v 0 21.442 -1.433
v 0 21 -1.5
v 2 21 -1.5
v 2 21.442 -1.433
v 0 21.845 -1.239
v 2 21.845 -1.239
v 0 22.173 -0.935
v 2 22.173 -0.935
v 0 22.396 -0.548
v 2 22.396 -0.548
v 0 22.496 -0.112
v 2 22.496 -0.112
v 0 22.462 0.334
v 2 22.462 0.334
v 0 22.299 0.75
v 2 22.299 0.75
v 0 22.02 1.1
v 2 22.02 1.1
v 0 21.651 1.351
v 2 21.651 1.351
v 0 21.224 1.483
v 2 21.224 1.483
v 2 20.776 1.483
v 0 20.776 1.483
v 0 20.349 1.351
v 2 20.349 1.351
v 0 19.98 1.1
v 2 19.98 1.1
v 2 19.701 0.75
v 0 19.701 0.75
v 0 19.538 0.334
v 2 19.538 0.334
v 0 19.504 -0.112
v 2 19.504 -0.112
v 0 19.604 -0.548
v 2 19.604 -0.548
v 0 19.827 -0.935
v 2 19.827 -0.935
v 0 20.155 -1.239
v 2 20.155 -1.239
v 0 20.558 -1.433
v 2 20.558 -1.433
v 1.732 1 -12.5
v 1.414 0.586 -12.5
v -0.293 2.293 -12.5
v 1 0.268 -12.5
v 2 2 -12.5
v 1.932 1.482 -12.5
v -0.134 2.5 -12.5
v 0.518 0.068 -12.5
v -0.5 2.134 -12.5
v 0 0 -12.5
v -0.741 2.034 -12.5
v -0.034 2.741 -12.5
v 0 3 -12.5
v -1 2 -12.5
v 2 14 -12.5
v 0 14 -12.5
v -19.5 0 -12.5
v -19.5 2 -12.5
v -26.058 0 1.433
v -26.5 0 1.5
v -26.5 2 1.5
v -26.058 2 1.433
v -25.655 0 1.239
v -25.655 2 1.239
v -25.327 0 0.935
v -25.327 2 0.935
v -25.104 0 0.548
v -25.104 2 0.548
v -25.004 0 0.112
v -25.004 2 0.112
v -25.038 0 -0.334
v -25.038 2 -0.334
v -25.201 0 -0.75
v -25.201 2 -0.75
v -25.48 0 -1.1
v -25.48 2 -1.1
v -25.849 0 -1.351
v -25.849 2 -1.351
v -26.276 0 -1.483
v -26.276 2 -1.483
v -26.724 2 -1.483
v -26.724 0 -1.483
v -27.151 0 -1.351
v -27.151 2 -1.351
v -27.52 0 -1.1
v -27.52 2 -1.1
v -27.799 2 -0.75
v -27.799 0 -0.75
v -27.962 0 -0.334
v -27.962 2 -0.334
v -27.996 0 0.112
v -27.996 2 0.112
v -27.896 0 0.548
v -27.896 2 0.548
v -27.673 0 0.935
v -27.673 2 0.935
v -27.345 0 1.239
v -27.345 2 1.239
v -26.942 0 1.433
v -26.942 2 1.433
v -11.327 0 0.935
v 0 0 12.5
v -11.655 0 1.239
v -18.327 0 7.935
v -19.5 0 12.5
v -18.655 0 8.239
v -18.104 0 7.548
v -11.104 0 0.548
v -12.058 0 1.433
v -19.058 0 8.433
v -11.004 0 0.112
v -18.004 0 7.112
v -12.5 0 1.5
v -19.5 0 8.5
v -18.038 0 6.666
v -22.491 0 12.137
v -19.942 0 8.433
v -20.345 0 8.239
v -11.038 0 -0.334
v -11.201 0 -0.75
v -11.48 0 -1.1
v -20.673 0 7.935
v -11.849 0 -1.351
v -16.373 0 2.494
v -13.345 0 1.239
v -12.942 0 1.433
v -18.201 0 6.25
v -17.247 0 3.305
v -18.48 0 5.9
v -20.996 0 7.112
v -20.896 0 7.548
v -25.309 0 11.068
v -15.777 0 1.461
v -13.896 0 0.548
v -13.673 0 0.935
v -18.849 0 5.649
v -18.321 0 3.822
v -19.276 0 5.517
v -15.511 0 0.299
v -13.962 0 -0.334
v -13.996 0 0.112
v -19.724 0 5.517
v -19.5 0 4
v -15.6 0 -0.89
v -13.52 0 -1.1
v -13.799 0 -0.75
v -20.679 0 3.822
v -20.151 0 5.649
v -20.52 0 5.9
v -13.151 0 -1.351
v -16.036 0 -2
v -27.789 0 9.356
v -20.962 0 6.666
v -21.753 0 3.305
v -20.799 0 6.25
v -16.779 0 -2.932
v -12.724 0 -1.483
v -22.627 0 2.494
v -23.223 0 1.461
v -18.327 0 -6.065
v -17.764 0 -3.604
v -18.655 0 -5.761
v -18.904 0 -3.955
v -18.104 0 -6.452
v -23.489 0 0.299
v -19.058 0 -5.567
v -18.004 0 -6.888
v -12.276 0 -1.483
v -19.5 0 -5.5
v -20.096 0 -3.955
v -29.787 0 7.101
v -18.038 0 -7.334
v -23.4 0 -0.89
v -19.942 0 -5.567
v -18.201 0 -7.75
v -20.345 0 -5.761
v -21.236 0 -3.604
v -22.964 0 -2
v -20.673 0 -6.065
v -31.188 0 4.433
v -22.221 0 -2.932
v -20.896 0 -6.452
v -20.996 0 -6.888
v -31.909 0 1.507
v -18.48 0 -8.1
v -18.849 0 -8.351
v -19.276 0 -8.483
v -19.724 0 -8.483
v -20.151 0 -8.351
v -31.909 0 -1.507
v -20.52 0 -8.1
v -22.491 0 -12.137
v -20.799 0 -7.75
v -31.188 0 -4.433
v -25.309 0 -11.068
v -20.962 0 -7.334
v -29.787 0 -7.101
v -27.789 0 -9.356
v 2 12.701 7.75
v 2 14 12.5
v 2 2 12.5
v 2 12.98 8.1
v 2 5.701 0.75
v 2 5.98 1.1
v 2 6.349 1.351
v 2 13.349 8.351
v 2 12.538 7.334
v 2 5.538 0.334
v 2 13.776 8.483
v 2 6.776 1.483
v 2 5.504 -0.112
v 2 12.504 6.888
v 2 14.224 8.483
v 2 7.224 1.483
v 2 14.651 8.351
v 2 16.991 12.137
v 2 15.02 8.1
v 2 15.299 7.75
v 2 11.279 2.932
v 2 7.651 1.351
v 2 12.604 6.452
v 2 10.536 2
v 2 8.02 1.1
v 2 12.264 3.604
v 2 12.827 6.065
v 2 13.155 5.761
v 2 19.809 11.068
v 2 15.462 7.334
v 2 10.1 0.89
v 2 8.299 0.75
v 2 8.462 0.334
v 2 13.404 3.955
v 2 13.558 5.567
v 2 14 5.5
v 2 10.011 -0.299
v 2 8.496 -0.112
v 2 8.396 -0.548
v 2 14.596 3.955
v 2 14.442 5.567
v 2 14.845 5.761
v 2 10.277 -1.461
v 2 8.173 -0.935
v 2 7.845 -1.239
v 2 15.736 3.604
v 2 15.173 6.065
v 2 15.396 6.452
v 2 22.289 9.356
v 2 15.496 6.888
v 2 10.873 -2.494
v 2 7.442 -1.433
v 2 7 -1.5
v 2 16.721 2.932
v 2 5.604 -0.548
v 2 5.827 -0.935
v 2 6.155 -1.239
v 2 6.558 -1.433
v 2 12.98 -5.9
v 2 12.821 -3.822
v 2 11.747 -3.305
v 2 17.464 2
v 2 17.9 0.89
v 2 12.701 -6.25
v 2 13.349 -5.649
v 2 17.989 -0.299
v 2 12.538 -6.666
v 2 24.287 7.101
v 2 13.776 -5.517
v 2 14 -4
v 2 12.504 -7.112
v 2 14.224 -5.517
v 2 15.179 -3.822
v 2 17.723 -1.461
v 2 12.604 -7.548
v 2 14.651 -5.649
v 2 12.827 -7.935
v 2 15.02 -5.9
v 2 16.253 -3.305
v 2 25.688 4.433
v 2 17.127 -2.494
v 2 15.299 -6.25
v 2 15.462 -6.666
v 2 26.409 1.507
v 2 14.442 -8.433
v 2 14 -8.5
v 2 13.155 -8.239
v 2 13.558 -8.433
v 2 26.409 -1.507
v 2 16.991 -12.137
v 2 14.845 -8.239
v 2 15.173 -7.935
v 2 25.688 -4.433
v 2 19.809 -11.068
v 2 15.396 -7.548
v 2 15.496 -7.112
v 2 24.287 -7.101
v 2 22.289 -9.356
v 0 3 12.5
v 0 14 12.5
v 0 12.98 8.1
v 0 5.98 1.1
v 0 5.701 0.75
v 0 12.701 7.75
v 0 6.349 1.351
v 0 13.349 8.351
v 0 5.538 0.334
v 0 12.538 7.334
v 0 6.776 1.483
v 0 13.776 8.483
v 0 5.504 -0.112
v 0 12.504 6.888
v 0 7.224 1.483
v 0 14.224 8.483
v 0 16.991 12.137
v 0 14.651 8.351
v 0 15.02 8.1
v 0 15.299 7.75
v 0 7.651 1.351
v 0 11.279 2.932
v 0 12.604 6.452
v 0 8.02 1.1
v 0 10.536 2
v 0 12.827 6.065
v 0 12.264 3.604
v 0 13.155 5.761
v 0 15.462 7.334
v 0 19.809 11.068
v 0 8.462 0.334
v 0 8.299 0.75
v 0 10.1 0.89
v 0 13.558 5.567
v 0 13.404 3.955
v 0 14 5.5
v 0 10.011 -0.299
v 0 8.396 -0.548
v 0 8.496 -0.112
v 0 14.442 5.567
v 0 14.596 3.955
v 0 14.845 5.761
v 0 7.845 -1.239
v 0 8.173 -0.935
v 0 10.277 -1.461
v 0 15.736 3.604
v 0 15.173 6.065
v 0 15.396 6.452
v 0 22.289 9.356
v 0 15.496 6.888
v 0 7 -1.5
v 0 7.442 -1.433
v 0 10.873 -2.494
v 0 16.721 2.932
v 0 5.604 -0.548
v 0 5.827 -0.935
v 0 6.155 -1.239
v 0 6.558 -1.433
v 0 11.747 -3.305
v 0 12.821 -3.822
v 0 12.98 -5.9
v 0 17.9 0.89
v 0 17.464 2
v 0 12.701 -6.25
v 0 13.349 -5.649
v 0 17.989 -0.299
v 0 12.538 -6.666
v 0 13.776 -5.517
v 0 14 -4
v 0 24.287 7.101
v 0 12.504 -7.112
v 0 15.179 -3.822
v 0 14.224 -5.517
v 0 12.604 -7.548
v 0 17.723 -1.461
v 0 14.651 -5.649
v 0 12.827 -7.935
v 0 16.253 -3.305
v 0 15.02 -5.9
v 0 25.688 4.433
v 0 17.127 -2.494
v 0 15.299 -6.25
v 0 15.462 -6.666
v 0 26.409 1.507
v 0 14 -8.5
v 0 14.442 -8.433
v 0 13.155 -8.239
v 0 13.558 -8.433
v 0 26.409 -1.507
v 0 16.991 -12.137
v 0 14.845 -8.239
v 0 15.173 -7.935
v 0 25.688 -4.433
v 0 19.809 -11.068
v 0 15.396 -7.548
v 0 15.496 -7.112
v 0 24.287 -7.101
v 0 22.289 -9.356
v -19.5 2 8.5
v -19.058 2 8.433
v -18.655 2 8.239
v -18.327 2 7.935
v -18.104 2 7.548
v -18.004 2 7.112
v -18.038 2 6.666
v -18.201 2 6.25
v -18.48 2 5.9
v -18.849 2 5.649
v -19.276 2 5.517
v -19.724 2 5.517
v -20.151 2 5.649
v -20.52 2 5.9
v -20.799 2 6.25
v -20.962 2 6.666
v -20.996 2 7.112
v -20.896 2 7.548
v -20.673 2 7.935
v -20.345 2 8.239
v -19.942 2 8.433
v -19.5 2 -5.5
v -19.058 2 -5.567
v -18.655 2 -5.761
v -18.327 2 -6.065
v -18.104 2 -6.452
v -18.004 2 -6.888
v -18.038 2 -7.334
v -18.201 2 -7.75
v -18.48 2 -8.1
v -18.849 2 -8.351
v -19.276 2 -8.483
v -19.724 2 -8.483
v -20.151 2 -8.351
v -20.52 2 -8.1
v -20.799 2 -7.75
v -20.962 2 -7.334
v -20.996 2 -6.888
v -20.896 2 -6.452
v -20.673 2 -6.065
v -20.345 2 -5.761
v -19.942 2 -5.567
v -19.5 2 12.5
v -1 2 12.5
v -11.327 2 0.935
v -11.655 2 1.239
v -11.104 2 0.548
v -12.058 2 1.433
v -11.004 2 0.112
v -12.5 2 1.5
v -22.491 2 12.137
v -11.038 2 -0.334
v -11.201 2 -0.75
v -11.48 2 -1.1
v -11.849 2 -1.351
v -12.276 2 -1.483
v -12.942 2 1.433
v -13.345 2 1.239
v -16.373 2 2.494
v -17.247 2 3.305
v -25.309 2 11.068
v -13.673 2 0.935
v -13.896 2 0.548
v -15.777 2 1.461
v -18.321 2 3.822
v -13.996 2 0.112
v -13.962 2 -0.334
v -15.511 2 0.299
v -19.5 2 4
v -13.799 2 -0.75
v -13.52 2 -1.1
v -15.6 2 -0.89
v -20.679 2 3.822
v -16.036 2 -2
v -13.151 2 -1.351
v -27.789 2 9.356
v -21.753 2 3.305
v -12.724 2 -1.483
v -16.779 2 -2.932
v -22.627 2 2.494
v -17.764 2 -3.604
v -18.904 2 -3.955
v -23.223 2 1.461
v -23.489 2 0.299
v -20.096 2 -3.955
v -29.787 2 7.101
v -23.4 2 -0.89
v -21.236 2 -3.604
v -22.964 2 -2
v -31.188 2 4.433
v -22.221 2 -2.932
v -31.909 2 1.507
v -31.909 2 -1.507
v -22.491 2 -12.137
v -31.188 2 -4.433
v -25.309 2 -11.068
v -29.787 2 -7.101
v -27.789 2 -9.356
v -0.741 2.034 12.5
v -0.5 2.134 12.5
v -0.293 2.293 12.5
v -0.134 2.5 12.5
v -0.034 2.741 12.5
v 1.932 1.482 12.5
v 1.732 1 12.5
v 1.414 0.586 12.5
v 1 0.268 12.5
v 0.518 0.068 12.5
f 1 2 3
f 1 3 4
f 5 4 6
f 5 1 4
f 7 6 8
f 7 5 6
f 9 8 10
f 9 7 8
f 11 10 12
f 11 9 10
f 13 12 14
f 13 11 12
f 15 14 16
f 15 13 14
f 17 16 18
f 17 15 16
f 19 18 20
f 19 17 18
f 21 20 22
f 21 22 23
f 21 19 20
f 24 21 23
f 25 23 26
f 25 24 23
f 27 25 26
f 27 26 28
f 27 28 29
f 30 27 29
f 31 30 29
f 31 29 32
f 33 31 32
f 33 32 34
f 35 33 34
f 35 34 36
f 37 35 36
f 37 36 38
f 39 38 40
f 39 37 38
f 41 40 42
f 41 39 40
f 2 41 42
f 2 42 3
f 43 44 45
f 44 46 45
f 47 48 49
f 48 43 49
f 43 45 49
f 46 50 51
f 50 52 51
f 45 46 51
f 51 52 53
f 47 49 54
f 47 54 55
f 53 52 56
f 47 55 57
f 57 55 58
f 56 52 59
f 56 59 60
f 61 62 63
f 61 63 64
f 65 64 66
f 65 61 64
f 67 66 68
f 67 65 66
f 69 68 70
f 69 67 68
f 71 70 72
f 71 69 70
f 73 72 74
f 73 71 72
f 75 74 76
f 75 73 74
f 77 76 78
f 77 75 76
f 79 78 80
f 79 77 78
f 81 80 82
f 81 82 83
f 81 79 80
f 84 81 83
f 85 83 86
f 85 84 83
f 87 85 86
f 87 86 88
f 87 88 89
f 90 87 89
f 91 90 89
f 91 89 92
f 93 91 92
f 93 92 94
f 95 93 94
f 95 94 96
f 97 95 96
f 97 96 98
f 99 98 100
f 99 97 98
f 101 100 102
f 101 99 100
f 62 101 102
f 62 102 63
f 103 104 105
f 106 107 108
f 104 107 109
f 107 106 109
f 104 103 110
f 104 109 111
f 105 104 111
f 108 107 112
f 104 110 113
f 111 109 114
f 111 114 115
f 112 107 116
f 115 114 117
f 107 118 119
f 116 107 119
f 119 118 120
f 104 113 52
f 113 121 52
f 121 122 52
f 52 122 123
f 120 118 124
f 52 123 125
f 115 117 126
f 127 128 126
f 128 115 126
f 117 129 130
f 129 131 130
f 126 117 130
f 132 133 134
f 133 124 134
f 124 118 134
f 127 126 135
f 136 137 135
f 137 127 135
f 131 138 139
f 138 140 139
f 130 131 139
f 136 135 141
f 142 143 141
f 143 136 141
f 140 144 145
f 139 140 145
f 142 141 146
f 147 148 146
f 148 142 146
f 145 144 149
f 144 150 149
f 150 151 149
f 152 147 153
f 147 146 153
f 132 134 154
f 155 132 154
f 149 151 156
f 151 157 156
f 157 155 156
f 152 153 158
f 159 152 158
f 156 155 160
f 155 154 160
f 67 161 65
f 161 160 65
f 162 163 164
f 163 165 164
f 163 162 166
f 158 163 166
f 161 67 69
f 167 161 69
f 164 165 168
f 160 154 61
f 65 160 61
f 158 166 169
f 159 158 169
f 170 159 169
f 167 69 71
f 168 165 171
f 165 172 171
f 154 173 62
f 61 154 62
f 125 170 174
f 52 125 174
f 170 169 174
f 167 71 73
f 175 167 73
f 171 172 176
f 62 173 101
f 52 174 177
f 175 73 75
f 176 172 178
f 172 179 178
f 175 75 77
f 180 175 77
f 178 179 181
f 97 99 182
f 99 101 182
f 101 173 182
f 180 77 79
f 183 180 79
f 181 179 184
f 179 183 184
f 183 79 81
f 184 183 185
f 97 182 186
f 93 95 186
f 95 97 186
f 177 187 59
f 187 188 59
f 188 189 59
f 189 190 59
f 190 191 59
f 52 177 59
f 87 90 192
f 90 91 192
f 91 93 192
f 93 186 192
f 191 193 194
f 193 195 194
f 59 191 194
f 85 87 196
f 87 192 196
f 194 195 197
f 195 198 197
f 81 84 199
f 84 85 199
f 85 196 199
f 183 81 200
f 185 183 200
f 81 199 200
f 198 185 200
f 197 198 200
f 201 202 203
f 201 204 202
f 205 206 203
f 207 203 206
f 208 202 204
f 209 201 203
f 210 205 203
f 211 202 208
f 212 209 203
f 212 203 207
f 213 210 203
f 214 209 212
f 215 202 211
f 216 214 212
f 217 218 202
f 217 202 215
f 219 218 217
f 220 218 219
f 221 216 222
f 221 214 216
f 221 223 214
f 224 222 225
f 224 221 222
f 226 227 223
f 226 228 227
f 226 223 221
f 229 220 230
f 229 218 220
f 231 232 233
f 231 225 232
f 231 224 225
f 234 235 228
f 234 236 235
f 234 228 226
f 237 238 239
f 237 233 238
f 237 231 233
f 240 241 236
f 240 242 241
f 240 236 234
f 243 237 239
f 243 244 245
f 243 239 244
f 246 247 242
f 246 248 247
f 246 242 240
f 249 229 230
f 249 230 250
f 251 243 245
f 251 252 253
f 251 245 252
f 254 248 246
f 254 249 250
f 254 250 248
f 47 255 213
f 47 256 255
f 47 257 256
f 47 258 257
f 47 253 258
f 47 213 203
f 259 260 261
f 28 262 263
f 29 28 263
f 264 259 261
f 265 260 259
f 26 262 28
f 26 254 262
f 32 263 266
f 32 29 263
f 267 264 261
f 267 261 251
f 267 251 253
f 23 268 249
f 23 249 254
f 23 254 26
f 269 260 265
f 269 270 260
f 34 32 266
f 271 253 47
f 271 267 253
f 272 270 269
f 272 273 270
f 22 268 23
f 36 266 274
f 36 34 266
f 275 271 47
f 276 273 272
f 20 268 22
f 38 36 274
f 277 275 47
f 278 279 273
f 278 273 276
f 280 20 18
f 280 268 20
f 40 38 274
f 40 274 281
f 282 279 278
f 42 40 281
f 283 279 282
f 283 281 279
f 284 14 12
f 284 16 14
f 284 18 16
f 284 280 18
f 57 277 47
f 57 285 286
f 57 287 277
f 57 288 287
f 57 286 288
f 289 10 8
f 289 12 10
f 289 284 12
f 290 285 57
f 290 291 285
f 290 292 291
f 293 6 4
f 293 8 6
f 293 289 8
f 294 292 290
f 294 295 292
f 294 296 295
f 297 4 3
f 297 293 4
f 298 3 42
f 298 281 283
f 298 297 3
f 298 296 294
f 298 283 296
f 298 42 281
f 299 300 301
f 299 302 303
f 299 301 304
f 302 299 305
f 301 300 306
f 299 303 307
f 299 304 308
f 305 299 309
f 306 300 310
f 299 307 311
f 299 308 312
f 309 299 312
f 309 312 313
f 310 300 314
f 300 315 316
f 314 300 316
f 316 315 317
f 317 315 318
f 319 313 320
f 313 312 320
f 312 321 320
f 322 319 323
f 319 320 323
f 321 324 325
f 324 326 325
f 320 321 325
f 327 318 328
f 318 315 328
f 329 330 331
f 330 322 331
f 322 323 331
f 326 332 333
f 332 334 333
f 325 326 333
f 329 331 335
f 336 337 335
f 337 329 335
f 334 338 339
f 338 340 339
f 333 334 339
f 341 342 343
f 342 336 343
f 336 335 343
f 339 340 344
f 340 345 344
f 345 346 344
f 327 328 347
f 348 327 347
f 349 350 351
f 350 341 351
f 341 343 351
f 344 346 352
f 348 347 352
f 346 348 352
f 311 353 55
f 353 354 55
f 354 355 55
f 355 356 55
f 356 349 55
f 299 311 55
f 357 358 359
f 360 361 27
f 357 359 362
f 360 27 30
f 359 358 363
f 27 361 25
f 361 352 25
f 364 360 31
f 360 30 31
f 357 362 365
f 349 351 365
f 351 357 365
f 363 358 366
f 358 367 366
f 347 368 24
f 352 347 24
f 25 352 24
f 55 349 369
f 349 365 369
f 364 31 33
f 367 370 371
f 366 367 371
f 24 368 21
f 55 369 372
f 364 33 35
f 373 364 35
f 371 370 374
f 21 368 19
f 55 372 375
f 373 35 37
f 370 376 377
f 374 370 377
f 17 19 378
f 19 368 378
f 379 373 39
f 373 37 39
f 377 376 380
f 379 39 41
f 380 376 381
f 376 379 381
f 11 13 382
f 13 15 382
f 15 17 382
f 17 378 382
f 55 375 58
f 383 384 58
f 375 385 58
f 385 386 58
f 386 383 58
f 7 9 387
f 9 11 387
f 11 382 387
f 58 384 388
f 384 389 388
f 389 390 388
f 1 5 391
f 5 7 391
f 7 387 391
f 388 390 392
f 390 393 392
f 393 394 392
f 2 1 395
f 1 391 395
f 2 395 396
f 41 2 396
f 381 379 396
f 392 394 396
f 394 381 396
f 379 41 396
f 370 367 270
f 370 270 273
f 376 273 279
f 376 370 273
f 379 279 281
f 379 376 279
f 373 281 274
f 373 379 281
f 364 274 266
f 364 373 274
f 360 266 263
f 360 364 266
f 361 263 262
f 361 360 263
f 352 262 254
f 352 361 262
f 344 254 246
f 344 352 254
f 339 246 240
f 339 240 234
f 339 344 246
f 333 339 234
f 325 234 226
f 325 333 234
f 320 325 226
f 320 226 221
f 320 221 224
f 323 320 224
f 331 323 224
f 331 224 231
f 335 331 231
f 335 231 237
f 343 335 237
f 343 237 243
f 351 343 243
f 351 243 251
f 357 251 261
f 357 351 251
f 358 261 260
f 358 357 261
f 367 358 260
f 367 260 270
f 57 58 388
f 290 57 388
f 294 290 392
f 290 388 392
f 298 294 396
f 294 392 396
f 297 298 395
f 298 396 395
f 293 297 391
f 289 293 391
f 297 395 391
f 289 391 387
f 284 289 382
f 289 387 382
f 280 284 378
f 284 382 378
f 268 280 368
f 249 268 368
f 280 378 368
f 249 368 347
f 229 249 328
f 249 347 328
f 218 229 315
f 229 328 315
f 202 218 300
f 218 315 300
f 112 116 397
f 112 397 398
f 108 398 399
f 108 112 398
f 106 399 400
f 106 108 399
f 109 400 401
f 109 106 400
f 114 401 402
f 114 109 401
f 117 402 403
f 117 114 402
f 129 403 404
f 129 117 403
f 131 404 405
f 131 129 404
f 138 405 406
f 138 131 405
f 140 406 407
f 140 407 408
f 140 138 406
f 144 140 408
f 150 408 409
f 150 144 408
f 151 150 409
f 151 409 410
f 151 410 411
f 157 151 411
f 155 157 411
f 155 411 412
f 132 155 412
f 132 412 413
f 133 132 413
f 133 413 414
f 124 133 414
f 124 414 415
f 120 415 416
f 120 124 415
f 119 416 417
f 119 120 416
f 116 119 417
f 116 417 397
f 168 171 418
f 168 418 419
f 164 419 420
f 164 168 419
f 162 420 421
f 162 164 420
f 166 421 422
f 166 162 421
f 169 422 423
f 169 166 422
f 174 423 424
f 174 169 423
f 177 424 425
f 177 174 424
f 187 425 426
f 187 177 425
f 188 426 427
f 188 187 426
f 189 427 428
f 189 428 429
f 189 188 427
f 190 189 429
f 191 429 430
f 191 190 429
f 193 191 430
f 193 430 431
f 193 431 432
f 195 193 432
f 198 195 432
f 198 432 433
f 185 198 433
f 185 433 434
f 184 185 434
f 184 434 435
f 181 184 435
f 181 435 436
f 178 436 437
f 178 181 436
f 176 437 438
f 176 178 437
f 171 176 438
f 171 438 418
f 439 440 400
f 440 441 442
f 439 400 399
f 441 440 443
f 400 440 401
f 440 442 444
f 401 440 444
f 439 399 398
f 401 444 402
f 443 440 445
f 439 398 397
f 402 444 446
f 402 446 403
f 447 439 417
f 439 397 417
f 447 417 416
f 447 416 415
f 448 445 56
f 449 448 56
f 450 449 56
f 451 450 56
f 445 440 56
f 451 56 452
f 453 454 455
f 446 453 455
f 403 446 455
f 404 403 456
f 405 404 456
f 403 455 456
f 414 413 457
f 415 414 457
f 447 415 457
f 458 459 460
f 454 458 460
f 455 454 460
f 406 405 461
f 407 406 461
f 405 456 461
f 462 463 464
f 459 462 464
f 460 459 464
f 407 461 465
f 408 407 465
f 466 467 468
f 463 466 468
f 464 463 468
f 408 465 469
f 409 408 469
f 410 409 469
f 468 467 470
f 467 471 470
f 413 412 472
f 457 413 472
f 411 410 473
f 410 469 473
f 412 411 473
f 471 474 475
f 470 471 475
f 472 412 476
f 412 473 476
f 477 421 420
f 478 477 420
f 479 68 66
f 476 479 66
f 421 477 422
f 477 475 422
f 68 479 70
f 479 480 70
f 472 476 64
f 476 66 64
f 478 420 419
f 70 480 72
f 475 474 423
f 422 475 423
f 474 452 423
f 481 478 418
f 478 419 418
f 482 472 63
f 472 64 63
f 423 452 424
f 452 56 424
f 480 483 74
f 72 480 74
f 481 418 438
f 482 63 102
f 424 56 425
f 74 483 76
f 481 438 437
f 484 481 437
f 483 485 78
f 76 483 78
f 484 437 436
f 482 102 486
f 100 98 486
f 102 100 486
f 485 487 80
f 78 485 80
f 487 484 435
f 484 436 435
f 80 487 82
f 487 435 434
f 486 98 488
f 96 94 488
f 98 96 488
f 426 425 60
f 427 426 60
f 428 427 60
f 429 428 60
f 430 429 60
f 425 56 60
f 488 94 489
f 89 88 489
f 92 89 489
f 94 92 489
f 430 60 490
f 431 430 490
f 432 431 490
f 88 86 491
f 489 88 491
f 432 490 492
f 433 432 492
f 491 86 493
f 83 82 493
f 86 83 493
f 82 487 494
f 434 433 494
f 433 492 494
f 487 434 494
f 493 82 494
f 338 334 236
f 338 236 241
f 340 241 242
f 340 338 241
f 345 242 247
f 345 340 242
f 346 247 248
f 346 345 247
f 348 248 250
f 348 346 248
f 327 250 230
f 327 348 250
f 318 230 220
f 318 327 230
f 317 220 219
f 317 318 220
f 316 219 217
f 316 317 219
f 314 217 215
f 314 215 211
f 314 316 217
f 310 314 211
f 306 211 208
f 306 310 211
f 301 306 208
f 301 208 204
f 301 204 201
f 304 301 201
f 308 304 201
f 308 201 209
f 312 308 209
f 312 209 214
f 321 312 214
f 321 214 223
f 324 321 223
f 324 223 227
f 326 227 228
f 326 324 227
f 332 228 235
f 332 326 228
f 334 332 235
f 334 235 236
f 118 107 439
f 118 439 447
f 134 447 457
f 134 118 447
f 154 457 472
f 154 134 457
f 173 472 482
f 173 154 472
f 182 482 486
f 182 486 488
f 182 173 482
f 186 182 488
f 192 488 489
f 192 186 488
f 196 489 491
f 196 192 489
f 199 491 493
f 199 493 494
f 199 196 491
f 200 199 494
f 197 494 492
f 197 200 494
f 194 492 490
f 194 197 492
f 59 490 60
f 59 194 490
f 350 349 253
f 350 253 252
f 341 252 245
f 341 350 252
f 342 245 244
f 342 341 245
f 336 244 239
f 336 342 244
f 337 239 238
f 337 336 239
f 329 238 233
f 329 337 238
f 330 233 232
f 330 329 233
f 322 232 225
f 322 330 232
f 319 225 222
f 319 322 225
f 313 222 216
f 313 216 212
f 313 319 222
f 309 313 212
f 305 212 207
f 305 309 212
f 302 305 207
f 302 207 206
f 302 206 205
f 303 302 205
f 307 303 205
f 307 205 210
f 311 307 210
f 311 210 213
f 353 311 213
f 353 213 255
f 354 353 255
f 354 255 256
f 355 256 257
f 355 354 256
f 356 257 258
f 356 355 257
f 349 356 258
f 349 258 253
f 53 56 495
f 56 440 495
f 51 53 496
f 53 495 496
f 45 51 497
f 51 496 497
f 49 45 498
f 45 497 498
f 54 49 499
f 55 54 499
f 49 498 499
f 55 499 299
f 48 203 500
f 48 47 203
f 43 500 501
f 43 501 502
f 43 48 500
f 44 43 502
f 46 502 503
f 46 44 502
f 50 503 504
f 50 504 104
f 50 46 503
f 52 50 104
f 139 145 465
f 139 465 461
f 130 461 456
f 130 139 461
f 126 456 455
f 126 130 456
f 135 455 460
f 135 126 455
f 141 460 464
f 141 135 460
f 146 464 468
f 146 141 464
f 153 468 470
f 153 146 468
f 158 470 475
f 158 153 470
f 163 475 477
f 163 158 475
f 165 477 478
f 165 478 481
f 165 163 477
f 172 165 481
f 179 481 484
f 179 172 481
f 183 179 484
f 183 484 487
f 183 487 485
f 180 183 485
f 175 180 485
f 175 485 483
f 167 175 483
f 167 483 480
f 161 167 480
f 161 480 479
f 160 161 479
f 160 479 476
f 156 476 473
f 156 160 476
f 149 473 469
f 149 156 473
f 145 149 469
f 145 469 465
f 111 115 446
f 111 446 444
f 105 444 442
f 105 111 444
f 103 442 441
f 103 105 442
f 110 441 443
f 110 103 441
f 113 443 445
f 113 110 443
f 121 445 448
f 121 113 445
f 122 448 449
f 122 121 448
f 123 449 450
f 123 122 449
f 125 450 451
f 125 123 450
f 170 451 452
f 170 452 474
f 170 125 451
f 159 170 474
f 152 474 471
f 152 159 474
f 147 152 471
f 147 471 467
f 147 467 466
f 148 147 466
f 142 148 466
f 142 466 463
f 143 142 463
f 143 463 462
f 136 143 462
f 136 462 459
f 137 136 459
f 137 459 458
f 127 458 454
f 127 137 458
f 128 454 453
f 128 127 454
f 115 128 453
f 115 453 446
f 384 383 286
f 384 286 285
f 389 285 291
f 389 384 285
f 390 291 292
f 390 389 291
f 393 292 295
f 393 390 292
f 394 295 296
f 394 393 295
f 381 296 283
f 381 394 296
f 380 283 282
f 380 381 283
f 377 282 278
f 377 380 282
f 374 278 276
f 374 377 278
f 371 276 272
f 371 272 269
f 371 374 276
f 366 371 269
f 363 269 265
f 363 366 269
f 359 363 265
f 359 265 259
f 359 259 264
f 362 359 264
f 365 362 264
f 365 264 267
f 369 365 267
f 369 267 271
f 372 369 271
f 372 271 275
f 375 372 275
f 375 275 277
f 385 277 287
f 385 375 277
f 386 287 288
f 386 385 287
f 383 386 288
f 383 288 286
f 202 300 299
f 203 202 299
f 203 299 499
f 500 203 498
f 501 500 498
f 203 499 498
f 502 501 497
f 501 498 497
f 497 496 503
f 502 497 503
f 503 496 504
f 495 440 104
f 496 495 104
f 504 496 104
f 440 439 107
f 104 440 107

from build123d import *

# Parameters (mm, degrees)
SKETCH1_R           = 4
SKETCH1_R_2         = 1.5
BOSS_EXTRUDE1_DEPTH = 2
SKETCH2_R           = 4
SKETCH2_R_2         = 1.5
BOSS_EXTRUDE2_DEPTH = 2
FILLET1_R           = 1
FILLET3_R           = 2


with BuildPart() as part:
    # Sketch1 → Boss-Extrude1 (new body)
    with BuildSketch(Plane(origin=(0, 0, 0), x_dir=(1, 0, 0), z_dir=(0, 1, 0))):
        with BuildLine():
            Line((0, 12.5), (0, -12.5))
            Line((0, -12.5), (-19.5, -12.5))
            ThreePointArc((-19.5, -12.5), (-32, 0), (-19.5, 12.5))
            Line((-19.5, 12.5), (0, 12.5))
        make_face()
        with Locations(Location((-19.5, 0, 0), (0, 0, 270))):
            Circle(SKETCH1_R, mode=Mode.SUBTRACT)
        with Locations(Location((-19.5, 7, 0), (0, 0, 270))):
            Circle(SKETCH1_R_2, mode=Mode.SUBTRACT)
        with Locations(Location((-19.5, -7, 0), (0, 0, 270))):
            Circle(SKETCH1_R_2, mode=Mode.SUBTRACT)
        with Locations(Location((-12.5, 0, 0), (0, 0, 270))):
            Circle(SKETCH1_R_2, mode=Mode.SUBTRACT)
        with Locations(Location((-26.5, 0, 0), (0, 0, 270))):
            Circle(SKETCH1_R_2, mode=Mode.SUBTRACT)
    extrude(amount=BOSS_EXTRUDE1_DEPTH)

    # Sketch2 → Boss-Extrude2 (add)
    with BuildSketch(Plane(origin=(0, 0, 0), x_dir=(0, 0, -1), z_dir=(1, 0, 0))):
        with BuildLine():
            Line((-12.5, 0), (12.5, 0))
            Line((12.5, 0), (12.5, 14))
            ThreePointArc((12.5, 14), (0, 26.5), (-12.5, 14))
            Line((-12.5, 14), (-12.5, 0))
        make_face()
        with Locations((0, 14)):
            Circle(SKETCH2_R, mode=Mode.SUBTRACT)
        with Locations((0, 21)):
            Circle(SKETCH2_R_2, mode=Mode.SUBTRACT)
        with Locations((7, 14)):
            Circle(SKETCH2_R_2, mode=Mode.SUBTRACT)
        with Locations((0, 7)):
            Circle(SKETCH2_R_2, mode=Mode.SUBTRACT)
        with Locations((-7, 14)):
            Circle(SKETCH2_R_2, mode=Mode.SUBTRACT)
    extrude(amount=BOSS_EXTRUDE2_DEPTH)

    # Fillet1
    fillet1_edges = [part.edges().sort_by_distance(p)[0] for p in [
        (0, 2, 0),
    ]]
    fillet(fillet1_edges, radius=FILLET1_R)

    # Fillet3
    fillet3_edges = [part.edges().sort_by_distance(p)[0] for p in [
        (2, 0, 0),
    ]]
    fillet(fillet3_edges, radius=FILLET3_R)


solid = part.part
